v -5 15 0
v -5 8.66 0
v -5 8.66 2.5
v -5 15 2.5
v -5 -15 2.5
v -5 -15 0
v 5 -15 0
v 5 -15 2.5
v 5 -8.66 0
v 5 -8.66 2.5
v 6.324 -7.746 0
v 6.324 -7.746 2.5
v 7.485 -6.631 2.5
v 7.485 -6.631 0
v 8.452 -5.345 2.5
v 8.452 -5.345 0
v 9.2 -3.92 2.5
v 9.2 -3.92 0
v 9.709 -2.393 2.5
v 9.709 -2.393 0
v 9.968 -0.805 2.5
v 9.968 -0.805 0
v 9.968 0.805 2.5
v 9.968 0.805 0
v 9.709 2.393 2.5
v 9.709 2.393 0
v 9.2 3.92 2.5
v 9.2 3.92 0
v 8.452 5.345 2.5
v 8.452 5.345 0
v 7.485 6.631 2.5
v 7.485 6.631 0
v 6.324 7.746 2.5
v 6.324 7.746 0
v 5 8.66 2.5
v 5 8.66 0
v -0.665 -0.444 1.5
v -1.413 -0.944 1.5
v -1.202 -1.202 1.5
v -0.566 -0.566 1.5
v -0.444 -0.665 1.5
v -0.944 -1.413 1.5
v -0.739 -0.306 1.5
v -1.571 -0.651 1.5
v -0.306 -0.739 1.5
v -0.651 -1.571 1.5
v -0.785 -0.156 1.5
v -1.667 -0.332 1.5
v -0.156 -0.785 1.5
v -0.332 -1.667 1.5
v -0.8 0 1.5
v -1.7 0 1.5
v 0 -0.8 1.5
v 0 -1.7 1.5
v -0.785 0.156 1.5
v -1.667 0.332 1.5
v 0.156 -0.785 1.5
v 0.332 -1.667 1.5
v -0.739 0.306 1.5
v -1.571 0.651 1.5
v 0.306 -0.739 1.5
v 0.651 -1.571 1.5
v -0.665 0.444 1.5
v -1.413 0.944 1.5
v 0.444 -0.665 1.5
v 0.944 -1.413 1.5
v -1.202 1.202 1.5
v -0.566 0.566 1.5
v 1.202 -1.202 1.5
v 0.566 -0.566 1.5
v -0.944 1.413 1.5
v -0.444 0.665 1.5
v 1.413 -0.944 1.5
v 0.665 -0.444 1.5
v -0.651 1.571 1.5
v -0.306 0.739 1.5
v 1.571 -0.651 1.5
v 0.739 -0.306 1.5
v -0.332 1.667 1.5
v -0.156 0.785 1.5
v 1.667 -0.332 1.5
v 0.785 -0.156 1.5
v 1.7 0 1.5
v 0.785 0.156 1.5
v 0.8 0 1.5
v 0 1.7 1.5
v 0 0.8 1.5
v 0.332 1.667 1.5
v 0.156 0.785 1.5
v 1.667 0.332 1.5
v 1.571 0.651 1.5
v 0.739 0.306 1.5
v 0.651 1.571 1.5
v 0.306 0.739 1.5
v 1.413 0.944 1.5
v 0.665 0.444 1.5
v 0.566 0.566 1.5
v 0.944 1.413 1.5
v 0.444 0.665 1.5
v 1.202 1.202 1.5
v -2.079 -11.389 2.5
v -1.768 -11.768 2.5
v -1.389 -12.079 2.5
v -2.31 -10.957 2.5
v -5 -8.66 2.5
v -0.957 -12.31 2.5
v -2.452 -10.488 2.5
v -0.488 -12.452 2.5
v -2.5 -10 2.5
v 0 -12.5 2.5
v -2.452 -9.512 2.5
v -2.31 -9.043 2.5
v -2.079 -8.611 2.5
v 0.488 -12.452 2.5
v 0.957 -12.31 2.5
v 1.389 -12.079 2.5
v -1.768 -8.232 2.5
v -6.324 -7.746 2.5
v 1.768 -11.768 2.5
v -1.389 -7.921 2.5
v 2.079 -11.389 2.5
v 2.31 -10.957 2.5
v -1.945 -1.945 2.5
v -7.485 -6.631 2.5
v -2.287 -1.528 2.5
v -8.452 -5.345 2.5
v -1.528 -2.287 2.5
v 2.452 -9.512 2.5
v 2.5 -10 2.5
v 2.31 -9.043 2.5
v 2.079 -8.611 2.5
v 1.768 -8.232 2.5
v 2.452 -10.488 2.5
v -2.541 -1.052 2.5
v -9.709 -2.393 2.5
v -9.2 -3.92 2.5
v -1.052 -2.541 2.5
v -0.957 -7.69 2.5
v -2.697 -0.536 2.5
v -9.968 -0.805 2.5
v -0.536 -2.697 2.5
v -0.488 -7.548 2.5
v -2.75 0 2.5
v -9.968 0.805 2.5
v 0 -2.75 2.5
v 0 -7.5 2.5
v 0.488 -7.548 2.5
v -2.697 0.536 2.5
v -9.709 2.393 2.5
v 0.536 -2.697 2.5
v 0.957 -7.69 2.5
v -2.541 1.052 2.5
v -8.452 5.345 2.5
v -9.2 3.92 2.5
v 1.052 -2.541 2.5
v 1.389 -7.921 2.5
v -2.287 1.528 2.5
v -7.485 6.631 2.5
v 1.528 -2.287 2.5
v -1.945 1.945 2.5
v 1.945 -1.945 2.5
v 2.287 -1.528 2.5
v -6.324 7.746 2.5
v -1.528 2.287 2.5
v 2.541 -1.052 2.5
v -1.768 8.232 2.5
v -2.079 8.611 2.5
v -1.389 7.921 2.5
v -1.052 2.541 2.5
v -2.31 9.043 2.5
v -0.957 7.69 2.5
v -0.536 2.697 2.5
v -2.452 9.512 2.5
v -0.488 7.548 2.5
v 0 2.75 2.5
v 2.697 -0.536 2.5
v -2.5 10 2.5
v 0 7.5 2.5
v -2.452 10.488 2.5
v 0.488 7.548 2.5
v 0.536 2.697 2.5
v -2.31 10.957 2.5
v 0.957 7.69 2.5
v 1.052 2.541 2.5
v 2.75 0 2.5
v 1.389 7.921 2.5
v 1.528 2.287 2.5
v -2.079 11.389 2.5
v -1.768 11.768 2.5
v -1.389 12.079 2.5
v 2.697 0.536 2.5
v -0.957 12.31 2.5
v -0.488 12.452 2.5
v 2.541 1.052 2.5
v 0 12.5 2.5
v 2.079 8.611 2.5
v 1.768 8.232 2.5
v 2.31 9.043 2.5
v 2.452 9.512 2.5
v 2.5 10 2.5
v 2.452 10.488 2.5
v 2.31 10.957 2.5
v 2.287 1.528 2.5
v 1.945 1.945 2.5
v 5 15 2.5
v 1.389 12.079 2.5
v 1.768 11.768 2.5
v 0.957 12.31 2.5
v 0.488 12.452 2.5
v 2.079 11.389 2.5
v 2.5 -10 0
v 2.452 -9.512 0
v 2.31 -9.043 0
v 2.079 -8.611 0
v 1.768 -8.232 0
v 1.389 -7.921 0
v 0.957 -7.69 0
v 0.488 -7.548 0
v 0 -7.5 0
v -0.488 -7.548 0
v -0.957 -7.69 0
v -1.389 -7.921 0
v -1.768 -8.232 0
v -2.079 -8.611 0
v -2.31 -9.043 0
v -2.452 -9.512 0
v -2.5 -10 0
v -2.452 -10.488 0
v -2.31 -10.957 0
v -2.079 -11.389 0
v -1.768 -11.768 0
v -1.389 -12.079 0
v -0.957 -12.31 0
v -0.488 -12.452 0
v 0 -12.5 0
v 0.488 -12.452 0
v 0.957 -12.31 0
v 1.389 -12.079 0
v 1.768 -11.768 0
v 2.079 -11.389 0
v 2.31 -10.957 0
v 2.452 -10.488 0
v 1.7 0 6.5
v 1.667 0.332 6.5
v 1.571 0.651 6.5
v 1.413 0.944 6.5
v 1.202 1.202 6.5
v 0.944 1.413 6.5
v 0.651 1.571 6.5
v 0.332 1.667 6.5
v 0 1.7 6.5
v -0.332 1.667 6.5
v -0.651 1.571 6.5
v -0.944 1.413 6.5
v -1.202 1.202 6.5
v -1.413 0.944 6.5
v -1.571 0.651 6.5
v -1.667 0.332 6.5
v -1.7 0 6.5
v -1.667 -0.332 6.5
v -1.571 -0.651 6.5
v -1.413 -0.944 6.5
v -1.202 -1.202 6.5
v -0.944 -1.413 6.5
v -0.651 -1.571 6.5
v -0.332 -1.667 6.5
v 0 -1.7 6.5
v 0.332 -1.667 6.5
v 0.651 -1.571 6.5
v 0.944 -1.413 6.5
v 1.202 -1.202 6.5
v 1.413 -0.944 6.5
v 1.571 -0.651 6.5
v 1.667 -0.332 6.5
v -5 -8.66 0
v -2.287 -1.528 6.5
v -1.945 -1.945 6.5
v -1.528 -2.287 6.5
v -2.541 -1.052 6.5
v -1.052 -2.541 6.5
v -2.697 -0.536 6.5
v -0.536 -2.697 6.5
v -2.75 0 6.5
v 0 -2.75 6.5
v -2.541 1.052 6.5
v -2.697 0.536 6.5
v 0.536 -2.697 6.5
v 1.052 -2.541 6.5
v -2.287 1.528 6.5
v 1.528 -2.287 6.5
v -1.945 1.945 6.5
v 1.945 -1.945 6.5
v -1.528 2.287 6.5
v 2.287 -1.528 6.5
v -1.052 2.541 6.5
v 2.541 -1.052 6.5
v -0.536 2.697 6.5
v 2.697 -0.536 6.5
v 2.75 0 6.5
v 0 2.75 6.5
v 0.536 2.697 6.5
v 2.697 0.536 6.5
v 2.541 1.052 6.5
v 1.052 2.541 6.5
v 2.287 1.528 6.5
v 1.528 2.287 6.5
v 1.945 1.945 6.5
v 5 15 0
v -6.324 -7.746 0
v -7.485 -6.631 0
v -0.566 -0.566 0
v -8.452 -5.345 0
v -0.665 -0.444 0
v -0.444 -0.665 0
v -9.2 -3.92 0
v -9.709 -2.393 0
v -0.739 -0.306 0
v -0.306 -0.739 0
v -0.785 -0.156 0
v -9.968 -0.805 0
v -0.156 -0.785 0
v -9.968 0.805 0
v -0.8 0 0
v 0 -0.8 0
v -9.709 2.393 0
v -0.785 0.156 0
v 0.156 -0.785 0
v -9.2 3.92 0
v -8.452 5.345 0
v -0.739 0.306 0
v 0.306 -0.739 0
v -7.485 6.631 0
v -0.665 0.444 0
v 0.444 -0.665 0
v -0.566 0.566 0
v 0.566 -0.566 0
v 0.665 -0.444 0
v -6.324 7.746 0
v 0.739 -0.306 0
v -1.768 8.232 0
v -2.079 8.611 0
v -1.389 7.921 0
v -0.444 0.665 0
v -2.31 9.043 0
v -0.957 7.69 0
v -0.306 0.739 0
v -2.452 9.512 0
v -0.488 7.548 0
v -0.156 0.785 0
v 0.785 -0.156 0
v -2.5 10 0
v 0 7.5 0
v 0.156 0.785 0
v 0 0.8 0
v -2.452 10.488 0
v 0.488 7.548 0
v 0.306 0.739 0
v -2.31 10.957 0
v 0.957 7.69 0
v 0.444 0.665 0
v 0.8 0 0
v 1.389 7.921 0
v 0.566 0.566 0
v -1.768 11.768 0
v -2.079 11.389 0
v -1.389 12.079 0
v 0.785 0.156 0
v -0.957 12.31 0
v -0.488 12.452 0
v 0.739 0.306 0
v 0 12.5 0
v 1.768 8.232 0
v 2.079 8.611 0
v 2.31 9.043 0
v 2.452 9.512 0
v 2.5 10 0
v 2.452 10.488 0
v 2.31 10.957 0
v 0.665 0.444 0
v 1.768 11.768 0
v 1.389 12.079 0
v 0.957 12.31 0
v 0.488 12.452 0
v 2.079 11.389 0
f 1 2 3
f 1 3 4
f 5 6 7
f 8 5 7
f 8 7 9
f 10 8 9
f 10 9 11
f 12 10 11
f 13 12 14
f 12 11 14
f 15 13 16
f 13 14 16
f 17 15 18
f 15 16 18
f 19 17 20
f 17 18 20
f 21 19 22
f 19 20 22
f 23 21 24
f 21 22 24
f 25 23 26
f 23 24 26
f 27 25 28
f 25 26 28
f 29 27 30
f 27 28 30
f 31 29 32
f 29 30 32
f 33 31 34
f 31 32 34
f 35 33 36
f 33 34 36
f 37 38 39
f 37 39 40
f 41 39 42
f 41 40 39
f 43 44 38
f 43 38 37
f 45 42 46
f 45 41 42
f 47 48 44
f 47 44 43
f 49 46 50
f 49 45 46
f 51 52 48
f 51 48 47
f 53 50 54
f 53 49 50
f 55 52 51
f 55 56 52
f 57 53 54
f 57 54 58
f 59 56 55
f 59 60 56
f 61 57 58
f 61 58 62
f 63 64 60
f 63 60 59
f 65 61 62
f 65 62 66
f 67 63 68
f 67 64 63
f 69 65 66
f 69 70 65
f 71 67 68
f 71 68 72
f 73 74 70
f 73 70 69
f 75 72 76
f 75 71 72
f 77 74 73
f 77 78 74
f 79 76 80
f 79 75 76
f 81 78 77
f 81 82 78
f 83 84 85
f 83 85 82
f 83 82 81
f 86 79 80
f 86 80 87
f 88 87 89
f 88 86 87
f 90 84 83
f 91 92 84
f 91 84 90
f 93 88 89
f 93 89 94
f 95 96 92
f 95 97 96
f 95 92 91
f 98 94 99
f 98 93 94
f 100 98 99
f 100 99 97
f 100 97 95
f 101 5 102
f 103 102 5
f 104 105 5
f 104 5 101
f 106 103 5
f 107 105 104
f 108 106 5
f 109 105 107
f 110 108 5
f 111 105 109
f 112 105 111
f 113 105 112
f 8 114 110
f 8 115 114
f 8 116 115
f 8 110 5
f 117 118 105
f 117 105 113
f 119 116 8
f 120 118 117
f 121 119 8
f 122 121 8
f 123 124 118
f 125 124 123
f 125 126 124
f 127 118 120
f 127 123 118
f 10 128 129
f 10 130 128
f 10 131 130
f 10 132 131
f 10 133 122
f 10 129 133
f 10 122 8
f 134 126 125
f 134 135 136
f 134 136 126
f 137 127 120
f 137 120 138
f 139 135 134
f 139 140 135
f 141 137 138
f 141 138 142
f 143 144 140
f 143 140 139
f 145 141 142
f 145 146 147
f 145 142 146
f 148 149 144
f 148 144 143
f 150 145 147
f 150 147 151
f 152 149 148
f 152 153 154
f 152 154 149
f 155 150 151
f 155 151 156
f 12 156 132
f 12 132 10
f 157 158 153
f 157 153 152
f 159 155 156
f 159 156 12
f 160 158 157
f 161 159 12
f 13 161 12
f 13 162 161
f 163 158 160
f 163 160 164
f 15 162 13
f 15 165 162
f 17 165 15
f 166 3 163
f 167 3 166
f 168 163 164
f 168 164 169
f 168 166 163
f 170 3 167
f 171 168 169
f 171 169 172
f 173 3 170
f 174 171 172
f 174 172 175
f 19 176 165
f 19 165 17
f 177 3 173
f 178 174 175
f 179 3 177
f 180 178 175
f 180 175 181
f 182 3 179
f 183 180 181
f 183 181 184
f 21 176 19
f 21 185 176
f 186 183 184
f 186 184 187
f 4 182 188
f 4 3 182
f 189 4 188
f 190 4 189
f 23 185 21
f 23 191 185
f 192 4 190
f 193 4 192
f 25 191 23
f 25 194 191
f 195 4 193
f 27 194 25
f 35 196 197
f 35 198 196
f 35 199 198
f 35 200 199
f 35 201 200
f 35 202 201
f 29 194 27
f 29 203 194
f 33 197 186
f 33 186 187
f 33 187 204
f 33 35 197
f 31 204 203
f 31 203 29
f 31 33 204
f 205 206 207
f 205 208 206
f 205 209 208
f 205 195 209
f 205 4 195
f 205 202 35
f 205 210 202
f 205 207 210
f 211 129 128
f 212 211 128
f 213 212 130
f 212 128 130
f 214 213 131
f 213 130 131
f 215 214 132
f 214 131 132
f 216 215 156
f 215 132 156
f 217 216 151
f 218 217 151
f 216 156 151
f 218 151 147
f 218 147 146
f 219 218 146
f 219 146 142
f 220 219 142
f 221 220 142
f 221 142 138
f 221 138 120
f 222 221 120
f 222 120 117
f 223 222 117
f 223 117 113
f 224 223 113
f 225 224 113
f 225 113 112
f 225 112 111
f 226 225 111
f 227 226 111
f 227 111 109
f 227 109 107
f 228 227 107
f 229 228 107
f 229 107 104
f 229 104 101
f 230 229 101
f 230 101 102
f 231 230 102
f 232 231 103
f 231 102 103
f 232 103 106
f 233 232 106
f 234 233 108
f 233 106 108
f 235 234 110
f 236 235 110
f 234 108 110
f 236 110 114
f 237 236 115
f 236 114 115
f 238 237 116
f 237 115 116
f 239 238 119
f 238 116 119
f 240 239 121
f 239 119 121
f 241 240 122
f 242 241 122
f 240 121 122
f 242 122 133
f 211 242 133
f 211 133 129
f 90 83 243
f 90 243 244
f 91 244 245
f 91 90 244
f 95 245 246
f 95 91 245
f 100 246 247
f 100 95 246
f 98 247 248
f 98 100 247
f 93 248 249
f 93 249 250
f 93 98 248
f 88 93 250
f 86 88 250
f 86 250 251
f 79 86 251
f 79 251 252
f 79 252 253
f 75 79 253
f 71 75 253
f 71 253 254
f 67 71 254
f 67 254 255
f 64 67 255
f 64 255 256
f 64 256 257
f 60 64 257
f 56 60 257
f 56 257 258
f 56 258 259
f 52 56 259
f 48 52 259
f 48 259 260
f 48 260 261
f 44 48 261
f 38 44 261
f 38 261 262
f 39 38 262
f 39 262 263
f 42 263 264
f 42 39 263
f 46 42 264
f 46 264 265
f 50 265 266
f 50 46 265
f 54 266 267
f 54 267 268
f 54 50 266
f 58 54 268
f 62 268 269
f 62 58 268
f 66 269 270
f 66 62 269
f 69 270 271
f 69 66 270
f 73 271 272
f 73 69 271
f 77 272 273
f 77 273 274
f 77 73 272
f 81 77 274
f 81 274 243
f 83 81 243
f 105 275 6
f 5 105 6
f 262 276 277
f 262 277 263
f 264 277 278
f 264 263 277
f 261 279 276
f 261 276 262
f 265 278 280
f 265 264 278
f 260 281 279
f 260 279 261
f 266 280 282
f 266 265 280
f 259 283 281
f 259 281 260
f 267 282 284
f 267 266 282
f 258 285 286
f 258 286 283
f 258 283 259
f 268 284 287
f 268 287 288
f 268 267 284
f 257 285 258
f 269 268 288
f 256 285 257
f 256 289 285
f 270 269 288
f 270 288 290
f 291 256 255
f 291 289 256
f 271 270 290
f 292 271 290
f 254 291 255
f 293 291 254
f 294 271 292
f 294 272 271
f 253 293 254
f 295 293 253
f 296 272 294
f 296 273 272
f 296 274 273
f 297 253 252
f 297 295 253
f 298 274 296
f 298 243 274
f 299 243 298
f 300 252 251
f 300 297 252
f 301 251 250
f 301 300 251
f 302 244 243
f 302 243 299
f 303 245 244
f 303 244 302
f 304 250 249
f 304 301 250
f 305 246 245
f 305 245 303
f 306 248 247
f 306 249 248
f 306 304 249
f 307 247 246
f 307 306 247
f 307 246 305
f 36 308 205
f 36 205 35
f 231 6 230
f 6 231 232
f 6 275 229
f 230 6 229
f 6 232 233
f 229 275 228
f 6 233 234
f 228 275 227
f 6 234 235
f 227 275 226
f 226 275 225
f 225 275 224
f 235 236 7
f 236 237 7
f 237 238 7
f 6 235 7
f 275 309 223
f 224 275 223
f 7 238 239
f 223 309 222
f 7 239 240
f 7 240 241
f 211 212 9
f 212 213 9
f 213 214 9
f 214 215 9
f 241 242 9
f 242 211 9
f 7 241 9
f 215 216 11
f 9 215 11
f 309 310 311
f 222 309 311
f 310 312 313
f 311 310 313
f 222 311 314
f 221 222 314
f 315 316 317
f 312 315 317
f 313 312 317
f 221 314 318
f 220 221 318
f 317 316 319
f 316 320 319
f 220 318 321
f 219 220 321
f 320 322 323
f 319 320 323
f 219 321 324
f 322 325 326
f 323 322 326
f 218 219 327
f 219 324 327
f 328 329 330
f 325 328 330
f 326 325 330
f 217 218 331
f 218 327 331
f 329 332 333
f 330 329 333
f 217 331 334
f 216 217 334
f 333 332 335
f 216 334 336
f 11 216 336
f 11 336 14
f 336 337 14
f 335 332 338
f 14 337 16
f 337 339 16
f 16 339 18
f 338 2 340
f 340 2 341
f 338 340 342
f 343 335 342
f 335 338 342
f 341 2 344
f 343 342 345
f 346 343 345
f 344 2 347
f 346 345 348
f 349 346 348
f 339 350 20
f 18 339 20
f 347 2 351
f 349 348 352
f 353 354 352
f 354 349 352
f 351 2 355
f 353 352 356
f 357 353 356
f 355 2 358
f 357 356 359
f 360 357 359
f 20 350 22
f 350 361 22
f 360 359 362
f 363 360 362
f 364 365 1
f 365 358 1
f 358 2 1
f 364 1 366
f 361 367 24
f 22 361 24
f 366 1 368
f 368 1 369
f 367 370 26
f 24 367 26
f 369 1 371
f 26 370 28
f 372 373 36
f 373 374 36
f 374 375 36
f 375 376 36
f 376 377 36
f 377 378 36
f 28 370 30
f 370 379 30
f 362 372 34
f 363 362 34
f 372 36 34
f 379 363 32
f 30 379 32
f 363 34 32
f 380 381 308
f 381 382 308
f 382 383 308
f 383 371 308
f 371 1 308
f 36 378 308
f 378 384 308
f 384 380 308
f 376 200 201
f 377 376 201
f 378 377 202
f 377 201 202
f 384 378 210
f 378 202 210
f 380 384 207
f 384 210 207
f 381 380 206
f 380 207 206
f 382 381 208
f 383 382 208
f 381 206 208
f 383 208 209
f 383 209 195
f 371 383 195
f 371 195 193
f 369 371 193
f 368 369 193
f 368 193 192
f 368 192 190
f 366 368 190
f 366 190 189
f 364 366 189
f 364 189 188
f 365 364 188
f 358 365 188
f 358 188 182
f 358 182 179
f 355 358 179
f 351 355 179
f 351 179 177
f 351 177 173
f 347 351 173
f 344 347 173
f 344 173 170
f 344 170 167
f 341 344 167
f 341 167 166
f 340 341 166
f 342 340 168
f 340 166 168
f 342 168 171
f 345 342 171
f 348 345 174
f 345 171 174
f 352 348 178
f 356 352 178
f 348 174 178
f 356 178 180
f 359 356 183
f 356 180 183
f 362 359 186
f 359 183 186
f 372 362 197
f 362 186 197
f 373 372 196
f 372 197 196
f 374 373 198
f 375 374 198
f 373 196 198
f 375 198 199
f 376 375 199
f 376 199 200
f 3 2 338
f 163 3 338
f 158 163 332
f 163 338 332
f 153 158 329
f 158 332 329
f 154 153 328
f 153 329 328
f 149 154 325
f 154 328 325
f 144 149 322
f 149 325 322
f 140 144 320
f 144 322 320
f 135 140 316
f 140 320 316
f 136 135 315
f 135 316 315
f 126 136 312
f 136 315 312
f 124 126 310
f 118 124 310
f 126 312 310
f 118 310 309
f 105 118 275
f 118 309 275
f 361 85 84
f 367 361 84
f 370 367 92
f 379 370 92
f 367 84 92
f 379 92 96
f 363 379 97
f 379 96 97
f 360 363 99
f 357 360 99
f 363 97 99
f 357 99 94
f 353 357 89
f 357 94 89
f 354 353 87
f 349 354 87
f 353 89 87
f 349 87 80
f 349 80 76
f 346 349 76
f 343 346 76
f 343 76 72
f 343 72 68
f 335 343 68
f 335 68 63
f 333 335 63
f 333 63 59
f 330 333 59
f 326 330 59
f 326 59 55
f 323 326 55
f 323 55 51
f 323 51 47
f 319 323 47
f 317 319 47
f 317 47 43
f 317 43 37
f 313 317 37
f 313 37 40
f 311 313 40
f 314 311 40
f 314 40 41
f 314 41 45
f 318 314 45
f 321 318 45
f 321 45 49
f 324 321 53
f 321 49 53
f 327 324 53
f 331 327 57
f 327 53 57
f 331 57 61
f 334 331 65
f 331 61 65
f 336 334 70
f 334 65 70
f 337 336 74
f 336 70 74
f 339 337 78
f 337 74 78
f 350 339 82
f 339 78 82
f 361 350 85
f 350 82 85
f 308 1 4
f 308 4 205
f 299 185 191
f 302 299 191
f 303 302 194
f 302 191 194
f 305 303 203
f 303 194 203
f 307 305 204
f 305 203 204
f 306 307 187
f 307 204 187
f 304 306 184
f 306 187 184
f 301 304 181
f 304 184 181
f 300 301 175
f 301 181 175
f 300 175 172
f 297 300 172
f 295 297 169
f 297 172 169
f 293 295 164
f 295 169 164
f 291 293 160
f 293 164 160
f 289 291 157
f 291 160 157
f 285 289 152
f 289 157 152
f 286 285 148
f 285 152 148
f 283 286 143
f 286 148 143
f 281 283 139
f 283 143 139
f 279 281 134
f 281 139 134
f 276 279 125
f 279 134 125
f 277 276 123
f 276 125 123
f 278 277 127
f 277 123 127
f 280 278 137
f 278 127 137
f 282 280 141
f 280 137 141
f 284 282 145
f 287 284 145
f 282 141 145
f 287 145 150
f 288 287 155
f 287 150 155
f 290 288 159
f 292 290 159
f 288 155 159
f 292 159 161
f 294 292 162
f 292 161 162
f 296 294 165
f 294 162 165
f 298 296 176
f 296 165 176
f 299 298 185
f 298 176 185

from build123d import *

# Parameters (mm, degrees)
ESQUISSE4_R             = 10
BOSS_EXTRU_3_DEPTH      = 2.5
ESQUISSE5_R             = 0.8
ENL_V_MAT_EXTRU_2_DEPTH = 3
ESQUISSE6_R             = 2.75
ESQUISSE6_R_2           = 1.7
BOSS_EXTRU_4_DEPTH      = 4
ENL_V_START             = -1
ESQUISSE10_R            = 1.7
ENL_V_MAT_EXTRU_3_DEPTH = 1
BOSS_EXTRU_8_START      = -2.5
BOSS_EXTRU_8_DEPTH      = 2.5
ESQUISSE19_R            = 2.5
ENL_V_MAT_EXTRU_4_DEPTH = 3


with BuildPart() as part:
    # Esquisse4 → Boss.-Extru.3 (new body)
    with BuildSketch(Plane.XY):
        Circle(ESQUISSE4_R)
    extrude(amount=BOSS_EXTRU_3_DEPTH)

    # Esquisse5 → Enlèv. mat.-Extru.2 (cut)
    with BuildSketch(Plane.XY.offset(2.5)):
        Circle(ESQUISSE5_R)
    extrude(amount=-ENL_V_MAT_EXTRU_2_DEPTH, mode=Mode.SUBTRACT)

    # Esquisse6 → Boss.-Extru.4 (add)
    with BuildSketch(Plane.XY.offset(2.5)):
        Circle(ESQUISSE6_R)
        Circle(ESQUISSE6_R_2, mode=Mode.SUBTRACT)
    extrude(amount=BOSS_EXTRU_4_DEPTH)

    # Esquisse10 → Enlèv. mat.-Extru.3 (cut)
    with BuildSketch(Plane.XY.offset(2.5).offset(ENL_V_START)):
        Circle(ESQUISSE10_R)
    extrude(amount=ENL_V_MAT_EXTRU_3_DEPTH, mode=Mode.SUBTRACT)

    # Esquisse17 → Boss.-Extru.8 (add)
    with BuildSketch(Plane.XY.offset(2.5).offset(BOSS_EXTRU_8_START)):
        with BuildLine():
            Line((-5, -8.660254038), (-5, -15))
            Line((-5, -15), (5, -15))
            Line((5, -15), (5, -8.660254038))
            ThreePointArc((5, -8.660254038), (0, -10), (-5, -8.660254038))
        make_face()
        with BuildLine():
            Line((5, 15), (5, 8.660254038))
            ThreePointArc((5, 8.660254038), (0, 10), (-5, 8.660254038))
            Line((-5, 8.660254038), (-5, 15))
            Line((-5, 15), (5, 15))
        make_face()
    extrude(amount=BOSS_EXTRU_8_DEPTH)

    # Esquisse19 → Enlèv. mat.-Extru.4 (cut)
    with BuildSketch(Plane.XY.offset(2.5)):
        with Locations((0, -10)):
            Circle(ESQUISSE19_R)
        with Locations((0, 10)):
            Circle(ESQUISSE19_R)
    extrude(amount=-ENL_V_MAT_EXTRU_4_DEPTH, mode=Mode.SUBTRACT)


solid = part.part
